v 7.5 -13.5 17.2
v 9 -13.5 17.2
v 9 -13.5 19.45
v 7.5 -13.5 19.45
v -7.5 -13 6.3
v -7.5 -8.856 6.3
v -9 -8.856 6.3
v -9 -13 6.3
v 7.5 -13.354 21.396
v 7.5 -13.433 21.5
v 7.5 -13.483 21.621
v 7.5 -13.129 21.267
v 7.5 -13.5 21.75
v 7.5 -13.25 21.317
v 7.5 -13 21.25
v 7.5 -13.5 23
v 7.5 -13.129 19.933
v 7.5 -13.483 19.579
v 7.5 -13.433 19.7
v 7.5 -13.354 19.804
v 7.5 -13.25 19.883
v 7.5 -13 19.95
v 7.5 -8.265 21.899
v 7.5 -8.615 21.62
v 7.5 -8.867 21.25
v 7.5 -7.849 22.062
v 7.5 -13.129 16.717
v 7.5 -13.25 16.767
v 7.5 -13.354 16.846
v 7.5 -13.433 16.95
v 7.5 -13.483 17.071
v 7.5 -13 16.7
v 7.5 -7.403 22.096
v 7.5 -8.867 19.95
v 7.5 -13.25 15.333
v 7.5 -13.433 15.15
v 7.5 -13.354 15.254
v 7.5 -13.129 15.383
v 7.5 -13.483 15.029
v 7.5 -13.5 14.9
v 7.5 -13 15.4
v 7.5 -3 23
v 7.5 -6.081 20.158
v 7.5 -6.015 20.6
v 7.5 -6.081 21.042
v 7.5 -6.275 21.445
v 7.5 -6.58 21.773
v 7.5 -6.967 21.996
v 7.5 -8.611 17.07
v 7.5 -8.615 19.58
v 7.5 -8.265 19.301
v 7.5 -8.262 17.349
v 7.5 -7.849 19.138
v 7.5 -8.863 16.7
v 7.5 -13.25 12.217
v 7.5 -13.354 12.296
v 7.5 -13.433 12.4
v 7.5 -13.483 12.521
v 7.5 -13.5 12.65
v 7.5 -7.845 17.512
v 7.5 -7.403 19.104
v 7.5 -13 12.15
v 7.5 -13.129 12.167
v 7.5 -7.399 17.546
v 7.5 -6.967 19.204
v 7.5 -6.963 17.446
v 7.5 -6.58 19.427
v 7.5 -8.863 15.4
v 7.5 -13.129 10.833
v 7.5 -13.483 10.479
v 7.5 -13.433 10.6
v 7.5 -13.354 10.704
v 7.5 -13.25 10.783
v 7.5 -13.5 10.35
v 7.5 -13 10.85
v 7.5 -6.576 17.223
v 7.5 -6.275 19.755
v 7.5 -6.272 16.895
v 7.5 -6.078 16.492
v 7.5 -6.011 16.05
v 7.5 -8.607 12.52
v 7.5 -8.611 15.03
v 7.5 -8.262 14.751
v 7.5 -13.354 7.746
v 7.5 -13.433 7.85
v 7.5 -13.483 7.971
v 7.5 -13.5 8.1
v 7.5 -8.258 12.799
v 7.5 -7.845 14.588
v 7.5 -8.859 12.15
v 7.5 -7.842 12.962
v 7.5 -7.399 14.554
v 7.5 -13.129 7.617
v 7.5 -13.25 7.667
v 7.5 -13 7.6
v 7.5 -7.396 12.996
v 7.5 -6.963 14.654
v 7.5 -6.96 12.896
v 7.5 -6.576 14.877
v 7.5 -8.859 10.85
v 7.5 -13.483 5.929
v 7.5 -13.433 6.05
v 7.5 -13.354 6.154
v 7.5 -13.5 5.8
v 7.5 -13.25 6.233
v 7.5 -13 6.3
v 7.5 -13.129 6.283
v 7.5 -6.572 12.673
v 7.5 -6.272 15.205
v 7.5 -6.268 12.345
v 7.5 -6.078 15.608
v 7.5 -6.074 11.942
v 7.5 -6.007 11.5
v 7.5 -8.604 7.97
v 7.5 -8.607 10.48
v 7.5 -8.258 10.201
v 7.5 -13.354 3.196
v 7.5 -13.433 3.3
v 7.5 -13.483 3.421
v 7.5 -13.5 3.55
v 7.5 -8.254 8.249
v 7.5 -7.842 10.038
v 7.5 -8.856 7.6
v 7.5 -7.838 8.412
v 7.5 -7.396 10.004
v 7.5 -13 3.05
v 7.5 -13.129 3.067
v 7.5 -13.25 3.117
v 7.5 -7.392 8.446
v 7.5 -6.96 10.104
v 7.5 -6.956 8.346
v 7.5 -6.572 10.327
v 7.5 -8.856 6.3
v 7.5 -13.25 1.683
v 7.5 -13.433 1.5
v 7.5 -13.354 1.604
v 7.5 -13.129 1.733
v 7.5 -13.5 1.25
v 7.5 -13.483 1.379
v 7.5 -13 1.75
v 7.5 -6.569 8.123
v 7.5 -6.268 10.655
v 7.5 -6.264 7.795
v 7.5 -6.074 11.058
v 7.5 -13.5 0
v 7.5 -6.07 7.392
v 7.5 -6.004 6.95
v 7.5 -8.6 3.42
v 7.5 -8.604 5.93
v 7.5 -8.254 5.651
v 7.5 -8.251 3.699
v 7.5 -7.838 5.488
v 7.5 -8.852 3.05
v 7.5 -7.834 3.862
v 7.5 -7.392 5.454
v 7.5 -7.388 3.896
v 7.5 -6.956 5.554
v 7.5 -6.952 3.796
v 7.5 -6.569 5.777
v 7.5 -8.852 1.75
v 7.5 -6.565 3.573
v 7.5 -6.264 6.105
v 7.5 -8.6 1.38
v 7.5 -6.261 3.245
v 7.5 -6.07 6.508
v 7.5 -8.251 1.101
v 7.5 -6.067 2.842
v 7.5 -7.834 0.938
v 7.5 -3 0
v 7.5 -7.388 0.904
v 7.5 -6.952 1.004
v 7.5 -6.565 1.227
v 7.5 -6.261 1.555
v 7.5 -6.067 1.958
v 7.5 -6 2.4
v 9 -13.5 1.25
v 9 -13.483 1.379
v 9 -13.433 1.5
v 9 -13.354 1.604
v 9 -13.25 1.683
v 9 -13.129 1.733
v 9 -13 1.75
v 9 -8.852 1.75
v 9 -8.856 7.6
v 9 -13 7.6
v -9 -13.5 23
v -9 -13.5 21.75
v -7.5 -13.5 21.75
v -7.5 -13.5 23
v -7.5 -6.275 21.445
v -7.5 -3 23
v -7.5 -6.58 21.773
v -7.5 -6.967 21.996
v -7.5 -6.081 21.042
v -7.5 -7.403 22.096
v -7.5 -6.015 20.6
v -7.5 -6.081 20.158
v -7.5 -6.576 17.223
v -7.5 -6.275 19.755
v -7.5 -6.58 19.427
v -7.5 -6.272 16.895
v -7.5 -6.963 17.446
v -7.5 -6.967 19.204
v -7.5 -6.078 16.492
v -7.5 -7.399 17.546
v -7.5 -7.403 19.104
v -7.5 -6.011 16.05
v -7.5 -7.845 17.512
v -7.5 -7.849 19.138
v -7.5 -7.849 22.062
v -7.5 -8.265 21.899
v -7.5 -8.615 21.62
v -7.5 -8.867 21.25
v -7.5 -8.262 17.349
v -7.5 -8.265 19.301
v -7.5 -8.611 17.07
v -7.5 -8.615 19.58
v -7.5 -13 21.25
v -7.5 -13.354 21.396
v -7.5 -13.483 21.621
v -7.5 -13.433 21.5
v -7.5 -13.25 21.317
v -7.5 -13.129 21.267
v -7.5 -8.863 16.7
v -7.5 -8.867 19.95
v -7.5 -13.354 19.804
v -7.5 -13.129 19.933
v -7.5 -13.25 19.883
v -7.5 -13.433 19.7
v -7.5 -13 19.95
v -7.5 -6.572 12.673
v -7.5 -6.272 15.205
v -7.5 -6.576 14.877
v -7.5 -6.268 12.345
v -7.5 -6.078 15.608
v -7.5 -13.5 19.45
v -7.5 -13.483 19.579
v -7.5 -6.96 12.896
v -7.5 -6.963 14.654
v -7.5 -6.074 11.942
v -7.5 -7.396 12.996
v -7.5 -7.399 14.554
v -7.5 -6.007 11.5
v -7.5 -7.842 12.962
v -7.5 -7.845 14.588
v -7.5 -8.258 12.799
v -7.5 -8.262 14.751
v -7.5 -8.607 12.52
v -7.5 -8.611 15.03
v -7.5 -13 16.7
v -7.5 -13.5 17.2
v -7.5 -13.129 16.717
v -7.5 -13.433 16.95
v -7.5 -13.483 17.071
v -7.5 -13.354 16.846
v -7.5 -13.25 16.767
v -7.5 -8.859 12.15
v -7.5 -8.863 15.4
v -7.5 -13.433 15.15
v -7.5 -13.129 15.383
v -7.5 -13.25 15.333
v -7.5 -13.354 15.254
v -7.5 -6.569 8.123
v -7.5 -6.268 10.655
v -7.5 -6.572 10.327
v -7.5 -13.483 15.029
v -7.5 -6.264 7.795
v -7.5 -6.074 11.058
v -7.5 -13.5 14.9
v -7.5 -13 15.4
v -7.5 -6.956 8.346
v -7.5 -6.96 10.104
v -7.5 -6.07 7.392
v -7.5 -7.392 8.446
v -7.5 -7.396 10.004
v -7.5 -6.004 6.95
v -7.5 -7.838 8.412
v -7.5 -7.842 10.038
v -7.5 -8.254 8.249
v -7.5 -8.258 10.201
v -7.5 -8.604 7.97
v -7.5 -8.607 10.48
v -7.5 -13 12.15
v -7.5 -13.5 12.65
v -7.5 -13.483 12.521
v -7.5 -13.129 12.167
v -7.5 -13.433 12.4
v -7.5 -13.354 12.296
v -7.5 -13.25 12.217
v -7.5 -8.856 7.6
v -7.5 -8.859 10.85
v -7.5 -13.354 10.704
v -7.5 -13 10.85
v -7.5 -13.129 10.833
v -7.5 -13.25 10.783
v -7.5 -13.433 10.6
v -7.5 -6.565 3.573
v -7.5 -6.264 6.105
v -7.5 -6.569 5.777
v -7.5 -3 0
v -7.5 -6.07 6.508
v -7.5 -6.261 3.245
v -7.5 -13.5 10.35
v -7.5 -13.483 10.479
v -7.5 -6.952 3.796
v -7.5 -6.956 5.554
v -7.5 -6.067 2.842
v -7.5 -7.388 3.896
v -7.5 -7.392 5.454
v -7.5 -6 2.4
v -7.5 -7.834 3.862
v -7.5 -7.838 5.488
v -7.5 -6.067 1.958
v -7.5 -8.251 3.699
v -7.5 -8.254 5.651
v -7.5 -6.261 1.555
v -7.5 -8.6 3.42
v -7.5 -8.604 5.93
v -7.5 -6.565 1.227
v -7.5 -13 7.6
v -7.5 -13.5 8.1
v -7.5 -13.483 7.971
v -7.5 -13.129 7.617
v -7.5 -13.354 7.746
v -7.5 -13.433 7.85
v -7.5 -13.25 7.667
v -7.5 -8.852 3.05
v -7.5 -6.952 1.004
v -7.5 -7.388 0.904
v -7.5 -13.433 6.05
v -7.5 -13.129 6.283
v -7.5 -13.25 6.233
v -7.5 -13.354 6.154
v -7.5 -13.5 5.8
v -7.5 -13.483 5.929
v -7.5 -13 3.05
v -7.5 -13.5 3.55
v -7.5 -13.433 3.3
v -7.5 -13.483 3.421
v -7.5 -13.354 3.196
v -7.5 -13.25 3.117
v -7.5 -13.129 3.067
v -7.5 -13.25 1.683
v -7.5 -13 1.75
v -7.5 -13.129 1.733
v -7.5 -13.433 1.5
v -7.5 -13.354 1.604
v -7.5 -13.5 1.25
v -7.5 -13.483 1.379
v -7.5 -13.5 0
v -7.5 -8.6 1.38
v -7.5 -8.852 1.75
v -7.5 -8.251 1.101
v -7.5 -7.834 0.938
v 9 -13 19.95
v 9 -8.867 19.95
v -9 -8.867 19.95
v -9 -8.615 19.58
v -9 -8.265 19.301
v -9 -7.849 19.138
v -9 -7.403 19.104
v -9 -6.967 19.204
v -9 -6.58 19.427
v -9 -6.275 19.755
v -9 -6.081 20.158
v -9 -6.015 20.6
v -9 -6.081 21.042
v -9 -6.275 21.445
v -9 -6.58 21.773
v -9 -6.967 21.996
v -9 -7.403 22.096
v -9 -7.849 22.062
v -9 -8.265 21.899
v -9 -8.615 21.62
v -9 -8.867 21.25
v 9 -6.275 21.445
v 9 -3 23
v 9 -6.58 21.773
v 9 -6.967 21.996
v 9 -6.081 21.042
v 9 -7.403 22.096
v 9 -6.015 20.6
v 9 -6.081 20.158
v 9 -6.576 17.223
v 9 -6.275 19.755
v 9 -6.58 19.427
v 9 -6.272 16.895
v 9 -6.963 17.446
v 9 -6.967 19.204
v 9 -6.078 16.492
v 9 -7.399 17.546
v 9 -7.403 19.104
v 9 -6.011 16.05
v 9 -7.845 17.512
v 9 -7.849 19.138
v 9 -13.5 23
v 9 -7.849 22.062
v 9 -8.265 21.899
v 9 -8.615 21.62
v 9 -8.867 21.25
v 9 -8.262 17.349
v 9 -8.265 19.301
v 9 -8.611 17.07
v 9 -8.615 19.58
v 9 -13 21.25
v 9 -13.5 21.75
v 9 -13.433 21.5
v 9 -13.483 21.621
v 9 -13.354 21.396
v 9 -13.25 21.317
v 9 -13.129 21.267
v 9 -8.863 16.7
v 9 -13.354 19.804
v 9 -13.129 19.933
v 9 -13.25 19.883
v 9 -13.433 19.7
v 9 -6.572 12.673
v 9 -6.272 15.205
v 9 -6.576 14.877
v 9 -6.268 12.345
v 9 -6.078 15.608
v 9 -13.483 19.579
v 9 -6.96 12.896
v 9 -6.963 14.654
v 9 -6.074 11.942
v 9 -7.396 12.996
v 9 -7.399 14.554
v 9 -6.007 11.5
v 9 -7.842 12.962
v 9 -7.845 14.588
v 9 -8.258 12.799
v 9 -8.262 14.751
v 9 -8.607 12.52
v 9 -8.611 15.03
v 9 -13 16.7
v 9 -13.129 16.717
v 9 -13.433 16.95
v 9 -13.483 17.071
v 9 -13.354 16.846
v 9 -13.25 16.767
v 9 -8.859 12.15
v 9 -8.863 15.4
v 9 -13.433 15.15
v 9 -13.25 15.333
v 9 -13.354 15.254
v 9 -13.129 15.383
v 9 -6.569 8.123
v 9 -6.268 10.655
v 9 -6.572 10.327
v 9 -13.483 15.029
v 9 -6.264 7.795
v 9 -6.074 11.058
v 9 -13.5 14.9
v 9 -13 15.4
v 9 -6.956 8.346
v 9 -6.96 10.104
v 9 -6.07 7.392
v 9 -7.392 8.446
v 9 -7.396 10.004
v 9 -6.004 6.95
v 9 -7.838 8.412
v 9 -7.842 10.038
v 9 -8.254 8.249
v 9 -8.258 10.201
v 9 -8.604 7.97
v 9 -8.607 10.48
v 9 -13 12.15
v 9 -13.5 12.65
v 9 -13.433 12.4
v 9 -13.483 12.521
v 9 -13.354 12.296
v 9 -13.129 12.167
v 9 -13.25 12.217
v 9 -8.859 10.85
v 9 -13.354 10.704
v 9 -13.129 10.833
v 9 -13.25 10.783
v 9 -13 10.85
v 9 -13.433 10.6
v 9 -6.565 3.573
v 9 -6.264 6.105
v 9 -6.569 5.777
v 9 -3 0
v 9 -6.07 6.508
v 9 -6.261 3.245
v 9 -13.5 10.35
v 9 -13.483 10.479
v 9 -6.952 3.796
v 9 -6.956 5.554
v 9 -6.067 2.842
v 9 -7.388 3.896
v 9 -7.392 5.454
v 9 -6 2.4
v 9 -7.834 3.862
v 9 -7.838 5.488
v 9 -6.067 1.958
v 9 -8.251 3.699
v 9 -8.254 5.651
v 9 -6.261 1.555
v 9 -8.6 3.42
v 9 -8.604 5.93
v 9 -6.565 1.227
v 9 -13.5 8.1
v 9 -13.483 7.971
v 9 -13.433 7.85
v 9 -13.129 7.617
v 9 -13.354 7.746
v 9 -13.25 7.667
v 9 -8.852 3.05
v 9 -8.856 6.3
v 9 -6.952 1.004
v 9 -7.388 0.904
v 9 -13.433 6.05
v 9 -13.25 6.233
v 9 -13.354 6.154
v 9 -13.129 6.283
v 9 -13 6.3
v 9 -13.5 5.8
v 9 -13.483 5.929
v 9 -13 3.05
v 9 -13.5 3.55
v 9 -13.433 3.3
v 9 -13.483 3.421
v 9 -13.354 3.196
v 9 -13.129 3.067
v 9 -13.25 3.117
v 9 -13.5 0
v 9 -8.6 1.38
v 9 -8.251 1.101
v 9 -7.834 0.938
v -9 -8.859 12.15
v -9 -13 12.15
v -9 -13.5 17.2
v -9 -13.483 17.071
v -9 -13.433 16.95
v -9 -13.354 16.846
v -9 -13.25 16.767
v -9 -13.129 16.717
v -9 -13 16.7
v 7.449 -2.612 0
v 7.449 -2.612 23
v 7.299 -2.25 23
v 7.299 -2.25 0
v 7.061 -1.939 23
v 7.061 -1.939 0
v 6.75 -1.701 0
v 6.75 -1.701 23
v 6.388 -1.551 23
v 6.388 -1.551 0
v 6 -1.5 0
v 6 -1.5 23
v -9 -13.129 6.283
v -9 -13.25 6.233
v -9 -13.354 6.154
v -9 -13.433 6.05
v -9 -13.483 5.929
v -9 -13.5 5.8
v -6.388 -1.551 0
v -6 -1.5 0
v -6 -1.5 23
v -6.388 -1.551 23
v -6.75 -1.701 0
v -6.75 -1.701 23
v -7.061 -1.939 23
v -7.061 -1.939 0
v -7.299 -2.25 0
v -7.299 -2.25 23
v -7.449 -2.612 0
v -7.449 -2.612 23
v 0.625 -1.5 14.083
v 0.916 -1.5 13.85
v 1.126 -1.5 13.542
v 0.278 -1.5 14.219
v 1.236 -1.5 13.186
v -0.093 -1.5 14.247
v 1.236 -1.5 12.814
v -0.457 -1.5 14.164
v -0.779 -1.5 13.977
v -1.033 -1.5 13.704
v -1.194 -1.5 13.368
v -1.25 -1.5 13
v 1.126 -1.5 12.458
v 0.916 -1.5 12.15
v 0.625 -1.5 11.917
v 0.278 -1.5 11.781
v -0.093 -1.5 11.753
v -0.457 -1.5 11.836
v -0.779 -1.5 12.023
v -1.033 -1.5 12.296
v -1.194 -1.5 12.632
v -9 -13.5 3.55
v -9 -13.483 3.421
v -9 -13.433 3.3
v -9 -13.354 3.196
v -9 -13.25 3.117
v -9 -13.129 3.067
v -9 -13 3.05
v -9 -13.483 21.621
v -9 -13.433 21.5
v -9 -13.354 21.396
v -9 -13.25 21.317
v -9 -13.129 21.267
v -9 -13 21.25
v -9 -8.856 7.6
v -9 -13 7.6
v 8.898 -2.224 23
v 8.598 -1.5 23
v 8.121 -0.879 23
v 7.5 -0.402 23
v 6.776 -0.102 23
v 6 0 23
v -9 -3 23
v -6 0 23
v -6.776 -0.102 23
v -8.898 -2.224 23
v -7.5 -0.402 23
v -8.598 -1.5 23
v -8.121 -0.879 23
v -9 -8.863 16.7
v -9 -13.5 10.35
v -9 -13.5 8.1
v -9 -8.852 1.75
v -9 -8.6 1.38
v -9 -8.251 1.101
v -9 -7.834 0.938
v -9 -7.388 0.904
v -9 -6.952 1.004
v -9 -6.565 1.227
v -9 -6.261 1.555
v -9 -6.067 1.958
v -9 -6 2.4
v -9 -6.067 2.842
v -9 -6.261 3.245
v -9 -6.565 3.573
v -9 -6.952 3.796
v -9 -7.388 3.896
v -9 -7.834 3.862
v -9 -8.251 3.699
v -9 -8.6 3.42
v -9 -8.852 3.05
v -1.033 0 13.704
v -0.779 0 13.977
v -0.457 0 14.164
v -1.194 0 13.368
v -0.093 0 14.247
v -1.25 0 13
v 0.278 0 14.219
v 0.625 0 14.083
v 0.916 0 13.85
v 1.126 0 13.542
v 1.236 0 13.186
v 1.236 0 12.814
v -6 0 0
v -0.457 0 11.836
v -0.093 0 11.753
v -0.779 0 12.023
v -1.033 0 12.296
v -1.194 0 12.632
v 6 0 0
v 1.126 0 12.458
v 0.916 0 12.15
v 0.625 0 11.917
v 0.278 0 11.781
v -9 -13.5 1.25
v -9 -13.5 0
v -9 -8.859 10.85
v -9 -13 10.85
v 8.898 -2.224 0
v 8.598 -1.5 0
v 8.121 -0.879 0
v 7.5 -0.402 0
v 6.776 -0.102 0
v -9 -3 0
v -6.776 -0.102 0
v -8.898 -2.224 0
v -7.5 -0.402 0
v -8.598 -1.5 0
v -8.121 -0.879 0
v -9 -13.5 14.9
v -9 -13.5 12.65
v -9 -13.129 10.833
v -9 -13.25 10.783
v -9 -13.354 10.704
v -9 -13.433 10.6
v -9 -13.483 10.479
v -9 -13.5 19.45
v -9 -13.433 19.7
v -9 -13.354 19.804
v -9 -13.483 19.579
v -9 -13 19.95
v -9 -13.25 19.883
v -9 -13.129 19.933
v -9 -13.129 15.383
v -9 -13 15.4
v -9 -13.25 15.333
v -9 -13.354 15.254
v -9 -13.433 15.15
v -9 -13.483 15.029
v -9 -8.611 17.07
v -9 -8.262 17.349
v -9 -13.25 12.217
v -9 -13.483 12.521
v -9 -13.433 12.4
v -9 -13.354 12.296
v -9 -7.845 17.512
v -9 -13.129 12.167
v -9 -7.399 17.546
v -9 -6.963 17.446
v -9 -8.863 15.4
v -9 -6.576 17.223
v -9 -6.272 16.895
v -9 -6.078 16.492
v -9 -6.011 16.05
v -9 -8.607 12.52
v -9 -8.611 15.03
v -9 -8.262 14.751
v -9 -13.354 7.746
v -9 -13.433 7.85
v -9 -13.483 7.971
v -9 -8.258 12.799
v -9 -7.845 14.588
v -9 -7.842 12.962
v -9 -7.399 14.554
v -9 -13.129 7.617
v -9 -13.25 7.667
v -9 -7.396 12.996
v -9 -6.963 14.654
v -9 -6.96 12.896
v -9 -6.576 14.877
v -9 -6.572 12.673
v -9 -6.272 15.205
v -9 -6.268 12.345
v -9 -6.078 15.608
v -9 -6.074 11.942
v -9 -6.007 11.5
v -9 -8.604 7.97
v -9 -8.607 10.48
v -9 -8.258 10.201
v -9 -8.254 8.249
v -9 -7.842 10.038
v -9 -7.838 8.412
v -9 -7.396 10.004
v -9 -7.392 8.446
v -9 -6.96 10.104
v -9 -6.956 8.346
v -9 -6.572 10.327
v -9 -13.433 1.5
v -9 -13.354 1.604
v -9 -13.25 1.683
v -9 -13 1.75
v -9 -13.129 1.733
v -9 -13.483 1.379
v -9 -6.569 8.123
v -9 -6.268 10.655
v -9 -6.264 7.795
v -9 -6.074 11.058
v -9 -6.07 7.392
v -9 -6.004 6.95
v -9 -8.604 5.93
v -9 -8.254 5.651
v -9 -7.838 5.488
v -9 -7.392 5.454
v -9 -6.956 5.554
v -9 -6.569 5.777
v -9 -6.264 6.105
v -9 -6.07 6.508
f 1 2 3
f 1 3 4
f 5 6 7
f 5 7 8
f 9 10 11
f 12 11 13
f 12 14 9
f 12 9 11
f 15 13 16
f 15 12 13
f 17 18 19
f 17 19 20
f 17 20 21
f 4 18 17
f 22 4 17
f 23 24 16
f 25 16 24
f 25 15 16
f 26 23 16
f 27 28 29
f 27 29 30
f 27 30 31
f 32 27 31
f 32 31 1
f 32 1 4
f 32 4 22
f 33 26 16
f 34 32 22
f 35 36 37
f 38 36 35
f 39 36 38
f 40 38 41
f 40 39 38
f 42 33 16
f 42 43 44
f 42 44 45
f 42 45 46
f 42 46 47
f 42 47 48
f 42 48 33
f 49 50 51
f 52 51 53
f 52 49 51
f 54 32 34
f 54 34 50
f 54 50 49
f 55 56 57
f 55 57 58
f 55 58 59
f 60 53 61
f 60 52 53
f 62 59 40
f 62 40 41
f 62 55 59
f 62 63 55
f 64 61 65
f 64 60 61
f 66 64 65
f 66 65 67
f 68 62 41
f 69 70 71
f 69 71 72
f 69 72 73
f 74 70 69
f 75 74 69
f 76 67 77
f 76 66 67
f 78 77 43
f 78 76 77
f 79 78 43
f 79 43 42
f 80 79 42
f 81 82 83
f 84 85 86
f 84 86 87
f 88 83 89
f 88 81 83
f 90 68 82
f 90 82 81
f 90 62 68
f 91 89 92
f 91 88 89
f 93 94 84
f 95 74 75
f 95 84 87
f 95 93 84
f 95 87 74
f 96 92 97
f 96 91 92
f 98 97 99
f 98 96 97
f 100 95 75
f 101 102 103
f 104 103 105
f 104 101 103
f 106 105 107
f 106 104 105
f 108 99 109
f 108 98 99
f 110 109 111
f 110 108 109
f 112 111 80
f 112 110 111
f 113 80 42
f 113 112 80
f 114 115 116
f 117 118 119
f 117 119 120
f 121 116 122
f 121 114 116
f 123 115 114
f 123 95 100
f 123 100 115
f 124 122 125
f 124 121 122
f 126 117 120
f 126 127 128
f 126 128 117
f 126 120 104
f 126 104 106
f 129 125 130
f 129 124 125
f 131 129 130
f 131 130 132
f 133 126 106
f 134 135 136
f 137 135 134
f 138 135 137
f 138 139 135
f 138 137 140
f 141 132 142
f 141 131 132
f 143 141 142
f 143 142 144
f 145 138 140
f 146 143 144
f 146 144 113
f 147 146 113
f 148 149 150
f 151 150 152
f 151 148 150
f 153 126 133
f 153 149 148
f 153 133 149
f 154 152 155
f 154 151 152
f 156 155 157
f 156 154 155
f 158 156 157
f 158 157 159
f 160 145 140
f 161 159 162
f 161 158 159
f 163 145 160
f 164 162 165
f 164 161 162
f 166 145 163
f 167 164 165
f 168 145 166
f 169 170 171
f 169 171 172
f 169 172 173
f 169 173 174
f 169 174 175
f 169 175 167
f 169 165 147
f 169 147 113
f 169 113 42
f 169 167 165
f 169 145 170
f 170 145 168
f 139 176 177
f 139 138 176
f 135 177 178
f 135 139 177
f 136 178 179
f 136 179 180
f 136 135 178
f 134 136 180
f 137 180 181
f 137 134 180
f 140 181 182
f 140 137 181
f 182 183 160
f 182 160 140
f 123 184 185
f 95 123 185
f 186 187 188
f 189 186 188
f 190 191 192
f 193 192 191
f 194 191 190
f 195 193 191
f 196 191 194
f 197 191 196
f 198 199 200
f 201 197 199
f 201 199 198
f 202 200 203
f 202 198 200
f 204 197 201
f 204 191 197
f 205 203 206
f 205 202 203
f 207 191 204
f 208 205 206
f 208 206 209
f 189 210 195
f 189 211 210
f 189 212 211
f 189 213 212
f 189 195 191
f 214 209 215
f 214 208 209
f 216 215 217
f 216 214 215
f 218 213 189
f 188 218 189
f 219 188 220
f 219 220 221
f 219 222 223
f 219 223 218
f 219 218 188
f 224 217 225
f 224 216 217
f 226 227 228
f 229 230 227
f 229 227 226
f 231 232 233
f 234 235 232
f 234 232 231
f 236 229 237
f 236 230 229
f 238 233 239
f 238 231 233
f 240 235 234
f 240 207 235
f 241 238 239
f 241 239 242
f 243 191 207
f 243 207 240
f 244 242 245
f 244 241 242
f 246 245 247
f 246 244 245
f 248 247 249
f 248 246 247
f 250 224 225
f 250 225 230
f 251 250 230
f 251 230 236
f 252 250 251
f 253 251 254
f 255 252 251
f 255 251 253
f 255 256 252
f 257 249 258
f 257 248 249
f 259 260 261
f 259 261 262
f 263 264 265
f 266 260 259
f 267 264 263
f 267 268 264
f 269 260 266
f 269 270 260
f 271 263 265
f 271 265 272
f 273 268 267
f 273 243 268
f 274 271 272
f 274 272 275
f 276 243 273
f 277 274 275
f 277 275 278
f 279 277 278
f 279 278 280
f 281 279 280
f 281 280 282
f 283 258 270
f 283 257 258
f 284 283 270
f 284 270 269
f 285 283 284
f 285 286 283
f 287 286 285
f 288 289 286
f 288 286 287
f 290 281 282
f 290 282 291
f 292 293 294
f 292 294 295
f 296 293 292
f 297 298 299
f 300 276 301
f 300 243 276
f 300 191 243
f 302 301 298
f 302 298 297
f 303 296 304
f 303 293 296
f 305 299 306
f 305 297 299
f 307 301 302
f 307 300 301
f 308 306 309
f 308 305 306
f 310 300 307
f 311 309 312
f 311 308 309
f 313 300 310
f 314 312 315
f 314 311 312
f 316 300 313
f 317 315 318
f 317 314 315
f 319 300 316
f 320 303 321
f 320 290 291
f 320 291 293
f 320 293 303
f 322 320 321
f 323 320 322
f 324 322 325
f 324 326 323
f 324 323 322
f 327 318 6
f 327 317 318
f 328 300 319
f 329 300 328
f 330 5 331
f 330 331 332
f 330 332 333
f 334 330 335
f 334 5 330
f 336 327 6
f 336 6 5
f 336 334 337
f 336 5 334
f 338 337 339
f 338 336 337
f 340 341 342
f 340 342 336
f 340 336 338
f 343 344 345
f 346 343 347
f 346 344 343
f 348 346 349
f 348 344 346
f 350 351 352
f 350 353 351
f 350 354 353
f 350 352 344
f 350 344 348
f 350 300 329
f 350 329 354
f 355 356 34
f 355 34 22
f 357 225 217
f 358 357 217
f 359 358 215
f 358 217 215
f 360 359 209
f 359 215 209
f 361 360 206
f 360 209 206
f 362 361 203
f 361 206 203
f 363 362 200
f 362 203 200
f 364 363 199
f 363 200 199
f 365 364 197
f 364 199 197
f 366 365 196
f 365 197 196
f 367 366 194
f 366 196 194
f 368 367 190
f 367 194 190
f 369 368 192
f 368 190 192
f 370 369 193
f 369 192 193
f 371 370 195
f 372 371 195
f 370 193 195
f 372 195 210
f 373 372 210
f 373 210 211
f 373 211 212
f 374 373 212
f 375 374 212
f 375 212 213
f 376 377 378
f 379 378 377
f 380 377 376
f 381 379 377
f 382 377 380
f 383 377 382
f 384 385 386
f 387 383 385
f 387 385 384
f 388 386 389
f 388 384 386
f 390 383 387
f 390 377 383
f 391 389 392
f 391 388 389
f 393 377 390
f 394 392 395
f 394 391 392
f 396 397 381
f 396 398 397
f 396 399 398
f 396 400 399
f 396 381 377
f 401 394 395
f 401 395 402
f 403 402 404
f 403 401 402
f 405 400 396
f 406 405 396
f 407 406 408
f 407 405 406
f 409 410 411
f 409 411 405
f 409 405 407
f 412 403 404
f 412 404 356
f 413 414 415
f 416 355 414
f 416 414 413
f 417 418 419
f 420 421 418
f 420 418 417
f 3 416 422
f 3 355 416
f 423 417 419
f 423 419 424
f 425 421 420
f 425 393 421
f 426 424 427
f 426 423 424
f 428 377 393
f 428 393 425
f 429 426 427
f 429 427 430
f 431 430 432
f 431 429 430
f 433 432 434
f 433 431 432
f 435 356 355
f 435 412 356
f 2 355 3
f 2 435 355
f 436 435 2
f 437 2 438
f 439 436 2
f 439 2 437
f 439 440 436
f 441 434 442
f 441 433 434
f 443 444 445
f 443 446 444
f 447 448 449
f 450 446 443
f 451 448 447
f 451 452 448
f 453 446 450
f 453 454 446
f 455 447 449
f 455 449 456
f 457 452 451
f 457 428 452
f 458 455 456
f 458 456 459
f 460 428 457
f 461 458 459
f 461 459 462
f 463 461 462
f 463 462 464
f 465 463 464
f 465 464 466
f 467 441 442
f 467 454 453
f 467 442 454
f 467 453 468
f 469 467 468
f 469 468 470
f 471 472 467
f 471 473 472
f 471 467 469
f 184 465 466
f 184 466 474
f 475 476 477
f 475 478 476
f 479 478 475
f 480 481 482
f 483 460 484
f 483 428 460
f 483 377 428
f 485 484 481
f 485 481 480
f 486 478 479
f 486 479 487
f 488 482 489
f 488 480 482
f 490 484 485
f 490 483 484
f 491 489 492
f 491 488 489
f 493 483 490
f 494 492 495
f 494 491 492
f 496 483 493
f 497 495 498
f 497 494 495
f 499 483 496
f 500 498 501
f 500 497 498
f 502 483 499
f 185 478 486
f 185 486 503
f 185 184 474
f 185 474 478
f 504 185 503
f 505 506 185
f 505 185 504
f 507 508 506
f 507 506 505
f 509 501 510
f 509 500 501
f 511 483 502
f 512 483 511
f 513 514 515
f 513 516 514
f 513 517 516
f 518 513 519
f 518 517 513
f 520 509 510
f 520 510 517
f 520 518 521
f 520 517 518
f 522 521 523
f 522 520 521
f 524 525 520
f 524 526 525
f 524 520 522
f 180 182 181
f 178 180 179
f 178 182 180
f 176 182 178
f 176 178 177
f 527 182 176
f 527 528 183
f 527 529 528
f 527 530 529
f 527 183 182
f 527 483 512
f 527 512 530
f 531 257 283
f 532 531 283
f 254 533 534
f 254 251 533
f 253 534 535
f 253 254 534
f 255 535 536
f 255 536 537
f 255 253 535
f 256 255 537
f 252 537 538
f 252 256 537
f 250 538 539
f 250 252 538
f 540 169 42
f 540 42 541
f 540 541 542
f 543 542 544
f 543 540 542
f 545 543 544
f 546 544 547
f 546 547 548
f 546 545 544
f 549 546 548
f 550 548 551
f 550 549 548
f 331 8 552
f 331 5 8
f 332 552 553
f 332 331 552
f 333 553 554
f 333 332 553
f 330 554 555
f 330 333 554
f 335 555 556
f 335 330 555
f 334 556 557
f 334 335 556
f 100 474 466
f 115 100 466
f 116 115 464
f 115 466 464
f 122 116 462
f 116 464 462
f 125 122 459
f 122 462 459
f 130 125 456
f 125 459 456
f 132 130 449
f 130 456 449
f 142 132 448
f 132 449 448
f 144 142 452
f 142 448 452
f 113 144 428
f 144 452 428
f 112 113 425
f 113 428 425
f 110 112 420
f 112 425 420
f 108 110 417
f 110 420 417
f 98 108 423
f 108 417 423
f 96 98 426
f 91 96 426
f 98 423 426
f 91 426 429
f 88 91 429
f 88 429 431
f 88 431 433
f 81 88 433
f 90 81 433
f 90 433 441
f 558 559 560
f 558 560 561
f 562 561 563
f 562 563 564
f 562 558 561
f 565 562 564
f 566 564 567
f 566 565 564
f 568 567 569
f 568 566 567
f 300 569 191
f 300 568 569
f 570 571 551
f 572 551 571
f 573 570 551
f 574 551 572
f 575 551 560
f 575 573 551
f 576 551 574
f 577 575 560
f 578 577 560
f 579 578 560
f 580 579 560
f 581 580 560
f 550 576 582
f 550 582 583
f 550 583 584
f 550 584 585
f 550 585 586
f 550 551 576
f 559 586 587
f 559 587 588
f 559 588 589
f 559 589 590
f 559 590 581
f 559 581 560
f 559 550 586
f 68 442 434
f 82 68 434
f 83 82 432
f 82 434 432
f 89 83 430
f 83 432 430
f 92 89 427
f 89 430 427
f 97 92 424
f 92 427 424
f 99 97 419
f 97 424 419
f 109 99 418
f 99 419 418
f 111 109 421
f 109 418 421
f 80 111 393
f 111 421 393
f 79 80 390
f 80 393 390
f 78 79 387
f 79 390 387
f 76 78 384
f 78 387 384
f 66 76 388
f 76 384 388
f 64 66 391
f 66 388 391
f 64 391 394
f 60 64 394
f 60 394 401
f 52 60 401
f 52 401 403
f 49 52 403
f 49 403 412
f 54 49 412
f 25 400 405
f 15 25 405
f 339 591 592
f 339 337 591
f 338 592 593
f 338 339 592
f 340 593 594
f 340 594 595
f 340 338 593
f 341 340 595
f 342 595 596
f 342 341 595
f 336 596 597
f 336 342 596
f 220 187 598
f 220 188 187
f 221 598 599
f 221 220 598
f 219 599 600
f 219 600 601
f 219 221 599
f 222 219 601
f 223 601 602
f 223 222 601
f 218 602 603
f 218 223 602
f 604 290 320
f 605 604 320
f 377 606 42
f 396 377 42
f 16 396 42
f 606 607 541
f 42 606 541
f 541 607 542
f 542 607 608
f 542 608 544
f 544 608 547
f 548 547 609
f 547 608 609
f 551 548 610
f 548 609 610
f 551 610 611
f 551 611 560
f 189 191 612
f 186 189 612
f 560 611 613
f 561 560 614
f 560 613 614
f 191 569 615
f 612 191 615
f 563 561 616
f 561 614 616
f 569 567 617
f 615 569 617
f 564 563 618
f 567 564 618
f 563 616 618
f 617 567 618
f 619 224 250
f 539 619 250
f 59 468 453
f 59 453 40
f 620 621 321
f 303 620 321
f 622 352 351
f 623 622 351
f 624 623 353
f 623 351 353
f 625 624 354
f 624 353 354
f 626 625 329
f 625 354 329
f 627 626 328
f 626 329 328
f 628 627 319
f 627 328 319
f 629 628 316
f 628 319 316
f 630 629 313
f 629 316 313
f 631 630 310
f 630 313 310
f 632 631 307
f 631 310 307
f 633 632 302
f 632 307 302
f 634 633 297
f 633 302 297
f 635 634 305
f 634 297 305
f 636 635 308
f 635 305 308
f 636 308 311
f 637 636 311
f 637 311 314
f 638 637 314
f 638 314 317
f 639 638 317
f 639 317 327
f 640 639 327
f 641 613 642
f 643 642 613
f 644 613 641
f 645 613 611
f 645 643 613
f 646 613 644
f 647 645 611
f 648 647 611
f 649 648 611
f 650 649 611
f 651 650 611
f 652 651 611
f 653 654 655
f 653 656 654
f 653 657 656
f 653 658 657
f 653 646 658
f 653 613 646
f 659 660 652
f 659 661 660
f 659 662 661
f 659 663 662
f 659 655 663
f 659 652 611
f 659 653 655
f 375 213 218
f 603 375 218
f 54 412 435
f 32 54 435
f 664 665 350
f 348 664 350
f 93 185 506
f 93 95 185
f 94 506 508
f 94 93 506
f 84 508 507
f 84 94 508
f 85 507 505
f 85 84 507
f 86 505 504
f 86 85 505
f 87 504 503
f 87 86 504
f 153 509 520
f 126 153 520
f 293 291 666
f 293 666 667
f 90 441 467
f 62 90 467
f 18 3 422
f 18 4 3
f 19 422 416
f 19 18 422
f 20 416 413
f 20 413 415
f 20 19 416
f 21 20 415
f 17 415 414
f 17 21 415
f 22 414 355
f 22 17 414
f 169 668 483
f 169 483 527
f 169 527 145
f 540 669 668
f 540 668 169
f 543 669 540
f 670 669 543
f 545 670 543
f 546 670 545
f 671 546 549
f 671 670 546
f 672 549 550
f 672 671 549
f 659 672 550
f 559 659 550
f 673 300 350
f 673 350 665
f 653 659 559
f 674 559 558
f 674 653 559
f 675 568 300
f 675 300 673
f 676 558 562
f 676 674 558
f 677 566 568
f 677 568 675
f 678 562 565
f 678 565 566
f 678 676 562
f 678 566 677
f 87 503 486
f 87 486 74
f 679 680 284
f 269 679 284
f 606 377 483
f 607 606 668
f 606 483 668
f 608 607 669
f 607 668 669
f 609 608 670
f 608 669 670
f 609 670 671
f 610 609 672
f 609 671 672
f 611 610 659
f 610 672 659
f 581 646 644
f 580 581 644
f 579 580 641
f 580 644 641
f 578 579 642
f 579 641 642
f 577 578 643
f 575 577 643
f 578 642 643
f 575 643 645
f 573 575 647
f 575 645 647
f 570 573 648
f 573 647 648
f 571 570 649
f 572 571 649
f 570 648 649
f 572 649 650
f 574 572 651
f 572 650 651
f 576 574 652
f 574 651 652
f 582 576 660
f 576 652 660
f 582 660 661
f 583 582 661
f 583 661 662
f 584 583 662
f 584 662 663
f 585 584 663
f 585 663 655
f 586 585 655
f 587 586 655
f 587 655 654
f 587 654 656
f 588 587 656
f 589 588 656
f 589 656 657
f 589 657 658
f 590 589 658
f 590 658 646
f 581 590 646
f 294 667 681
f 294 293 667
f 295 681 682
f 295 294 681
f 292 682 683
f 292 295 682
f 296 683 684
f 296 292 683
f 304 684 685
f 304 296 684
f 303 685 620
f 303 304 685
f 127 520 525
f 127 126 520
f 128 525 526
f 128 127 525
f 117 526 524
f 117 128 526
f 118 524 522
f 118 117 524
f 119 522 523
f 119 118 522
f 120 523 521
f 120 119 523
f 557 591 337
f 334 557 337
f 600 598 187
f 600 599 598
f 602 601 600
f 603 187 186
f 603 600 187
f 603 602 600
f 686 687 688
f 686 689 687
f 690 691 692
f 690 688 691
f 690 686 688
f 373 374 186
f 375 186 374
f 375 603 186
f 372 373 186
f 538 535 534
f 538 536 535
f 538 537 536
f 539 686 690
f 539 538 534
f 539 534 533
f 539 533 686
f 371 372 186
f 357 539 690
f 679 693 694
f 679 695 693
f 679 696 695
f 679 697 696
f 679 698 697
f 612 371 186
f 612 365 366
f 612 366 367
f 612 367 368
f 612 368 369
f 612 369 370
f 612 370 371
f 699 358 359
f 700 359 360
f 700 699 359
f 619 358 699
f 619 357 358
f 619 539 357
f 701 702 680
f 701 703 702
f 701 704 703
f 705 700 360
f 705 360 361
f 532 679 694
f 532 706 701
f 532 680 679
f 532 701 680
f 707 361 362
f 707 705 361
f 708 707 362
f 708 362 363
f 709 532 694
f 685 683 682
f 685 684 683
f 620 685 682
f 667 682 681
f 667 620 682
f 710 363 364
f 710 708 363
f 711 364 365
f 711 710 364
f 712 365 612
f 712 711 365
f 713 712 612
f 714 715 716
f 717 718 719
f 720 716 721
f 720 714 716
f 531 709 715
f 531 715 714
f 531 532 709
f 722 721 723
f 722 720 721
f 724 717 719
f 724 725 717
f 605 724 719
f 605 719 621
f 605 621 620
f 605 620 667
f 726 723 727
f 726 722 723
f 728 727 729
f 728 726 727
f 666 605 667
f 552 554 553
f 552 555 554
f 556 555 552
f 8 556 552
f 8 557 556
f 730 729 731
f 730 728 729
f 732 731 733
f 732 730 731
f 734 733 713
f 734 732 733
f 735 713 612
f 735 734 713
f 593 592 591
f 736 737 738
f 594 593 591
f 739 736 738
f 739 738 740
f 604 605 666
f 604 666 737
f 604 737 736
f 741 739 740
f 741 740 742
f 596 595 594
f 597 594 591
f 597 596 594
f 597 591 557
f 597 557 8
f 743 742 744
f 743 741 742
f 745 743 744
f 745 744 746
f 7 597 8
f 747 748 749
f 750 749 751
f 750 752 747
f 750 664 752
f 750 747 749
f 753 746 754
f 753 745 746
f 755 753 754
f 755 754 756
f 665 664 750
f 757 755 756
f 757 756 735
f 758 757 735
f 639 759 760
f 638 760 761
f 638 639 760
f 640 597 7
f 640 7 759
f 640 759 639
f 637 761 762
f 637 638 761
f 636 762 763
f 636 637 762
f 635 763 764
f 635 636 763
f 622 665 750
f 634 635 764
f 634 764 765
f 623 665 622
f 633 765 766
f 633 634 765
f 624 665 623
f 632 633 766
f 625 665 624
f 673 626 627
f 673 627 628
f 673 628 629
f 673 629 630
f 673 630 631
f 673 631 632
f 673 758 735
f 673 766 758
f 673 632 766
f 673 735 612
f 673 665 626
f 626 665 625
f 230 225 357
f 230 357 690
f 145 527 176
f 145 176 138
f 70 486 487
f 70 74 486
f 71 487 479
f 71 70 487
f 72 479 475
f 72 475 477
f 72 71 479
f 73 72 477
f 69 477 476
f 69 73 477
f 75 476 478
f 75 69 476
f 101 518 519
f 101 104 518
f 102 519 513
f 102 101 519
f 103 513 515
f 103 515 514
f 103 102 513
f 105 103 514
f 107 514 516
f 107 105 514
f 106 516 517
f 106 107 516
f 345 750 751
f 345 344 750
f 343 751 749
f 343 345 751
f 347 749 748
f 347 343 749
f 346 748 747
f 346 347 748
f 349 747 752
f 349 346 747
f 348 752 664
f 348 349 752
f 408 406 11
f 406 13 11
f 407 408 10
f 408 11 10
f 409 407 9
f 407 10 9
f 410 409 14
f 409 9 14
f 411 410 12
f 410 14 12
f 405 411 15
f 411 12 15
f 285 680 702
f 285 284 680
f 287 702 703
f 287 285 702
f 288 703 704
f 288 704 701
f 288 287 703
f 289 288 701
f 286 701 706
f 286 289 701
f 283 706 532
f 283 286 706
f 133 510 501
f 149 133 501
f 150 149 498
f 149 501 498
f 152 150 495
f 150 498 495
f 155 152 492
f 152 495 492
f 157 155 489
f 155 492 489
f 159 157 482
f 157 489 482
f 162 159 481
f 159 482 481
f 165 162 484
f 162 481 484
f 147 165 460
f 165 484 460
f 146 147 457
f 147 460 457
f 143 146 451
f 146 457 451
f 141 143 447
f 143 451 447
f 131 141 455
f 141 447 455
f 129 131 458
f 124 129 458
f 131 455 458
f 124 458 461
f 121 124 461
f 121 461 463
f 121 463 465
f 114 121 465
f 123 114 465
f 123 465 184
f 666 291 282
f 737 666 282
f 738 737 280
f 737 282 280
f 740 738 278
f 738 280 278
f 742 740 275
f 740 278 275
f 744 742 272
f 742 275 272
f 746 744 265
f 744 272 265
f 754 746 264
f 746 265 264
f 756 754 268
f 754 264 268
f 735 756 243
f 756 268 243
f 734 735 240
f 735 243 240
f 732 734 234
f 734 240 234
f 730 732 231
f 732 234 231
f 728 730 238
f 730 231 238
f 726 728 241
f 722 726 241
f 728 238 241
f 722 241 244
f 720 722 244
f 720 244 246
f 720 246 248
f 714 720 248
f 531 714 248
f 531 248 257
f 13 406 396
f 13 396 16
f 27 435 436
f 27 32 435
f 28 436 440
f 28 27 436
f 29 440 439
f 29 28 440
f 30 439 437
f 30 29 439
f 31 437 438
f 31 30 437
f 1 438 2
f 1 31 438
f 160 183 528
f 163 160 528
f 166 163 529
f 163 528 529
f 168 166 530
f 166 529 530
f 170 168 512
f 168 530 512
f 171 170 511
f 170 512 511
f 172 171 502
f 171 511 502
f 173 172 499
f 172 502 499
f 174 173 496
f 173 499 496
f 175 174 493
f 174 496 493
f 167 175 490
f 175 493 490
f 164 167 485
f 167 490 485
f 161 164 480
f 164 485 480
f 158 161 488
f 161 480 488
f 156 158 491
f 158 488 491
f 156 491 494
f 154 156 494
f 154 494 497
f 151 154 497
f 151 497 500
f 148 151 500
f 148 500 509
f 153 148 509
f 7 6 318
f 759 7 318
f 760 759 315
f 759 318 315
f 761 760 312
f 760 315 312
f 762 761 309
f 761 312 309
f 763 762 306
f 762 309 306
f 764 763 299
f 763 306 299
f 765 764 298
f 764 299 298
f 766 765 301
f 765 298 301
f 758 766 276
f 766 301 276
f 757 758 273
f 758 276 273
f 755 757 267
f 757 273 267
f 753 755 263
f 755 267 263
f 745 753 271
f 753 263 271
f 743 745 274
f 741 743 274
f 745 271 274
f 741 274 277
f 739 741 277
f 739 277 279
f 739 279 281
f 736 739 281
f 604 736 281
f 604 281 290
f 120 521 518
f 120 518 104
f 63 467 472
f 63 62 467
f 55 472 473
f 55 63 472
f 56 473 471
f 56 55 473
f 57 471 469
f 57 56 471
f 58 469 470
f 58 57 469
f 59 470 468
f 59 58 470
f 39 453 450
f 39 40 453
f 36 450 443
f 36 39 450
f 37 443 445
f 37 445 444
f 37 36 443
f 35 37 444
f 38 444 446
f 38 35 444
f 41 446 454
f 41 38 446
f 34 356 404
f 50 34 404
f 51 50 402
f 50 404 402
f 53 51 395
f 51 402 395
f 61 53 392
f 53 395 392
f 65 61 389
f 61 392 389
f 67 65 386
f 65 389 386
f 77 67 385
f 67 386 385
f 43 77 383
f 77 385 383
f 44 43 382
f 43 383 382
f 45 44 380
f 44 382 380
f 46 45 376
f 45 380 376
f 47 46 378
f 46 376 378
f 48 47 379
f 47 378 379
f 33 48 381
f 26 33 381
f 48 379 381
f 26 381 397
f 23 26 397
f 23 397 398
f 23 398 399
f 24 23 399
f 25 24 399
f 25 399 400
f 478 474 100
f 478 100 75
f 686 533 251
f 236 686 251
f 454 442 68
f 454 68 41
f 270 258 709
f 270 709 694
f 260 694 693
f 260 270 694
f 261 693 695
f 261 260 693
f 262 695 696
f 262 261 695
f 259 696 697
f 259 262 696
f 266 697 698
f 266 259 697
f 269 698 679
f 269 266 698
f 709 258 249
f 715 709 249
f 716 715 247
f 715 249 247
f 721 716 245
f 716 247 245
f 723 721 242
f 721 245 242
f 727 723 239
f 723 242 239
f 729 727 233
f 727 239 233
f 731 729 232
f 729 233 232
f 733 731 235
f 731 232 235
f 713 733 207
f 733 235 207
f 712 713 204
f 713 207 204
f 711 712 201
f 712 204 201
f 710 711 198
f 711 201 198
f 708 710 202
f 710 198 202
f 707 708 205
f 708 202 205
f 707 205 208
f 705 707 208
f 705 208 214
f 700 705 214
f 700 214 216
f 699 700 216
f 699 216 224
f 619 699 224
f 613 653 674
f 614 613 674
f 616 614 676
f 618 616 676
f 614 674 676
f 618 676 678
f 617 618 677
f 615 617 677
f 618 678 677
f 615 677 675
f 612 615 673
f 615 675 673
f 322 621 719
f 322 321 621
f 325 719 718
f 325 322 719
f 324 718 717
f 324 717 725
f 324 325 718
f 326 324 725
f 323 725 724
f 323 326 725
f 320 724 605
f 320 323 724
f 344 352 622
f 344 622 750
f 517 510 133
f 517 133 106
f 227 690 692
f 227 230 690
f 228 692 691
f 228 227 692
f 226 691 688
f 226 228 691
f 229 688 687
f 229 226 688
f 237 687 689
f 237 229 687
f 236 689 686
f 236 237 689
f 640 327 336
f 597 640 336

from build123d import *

# Parameters (mm, degrees)
PAD_DEPTH       = 23
POCKET_DEPTH    = 18.001
FILLET_R        = 0.5
SKETCH002_R     = 1.25
POCKET001_DEPTH = 5


with BuildPart() as part:
    # Sketch → Pad (new body)
    with BuildSketch(Plane.XY):
        with BuildLine():
            Line((-9, -13.5), (-9, -3))
            ThreePointArc((-6, 0), (-8.12132, -0.87868), (-9, -3))
            Line((-6, 0), (6, 0))
            ThreePointArc((9, -3), (8.12132, -0.87868), (6, 0))
            Line((9, -3), (9, -13.5))
            Line((9, -13.5), (7.5, -13.5))
            Line((7.5, -13.5), (7.5, -3))
            ThreePointArc((7.5, -3), (7.06066, -1.93934), (6, -1.5))
            Line((6, -1.5), (-6, -1.5))
            ThreePointArc((-6, -1.5), (-7.06066, -1.93934), (-7.5, -3))
            Line((-7.5, -3), (-7.5, -13.5))
            Line((-9, -13.5), (-7.5, -13.5))
        make_face()
    extrude(amount=PAD_DEPTH)

    # Sketch001 (on DatumPlane) → Pocket (cut, through all)
    with BuildSketch(Plane.YZ.offset(9)):
        with BuildLine():
            ThreePointArc((-8.851851, 1.75), (-6, 2.4), (-8.851851, 3.05))
            Line((-8.851851, 3.05), (-14, 3.05))
            Line((-14, 3.05), (-14, 1.75))
            Line((-8.851851, 1.75), (-14, 1.75))
        make_face()
        with BuildLine():
            ThreePointArc((-8.855532, 6.3), (-6.003681, 6.95), (-8.855532, 7.6))
            Line((-8.855532, 7.6), (-14.003681, 7.6))
            Line((-14.003681, 7.6), (-14.003681, 6.3))
            Line((-8.855532, 6.3), (-14.003681, 6.3))
        make_face()
        with BuildLine():
            ThreePointArc((-8.859213, 10.85), (-6.007362, 11.5), (-8.859213, 12.15))
            Line((-8.859213, 12.15), (-14.007362, 12.15))
            Line((-14.007362, 12.15), (-14.007362, 10.85))
            Line((-8.859213, 10.85), (-14.007362, 10.85))
        make_face()
        with BuildLine():
            ThreePointArc((-8.862893, 15.4), (-6.011042, 16.05), (-8.862893, 16.7))
            Line((-8.862893, 16.7), (-14.011042, 16.7))
            Line((-14.011042, 16.7), (-14.011042, 15.4))
            Line((-8.862893, 15.4), (-14.011042, 15.4))
        make_face()
        with BuildLine():
            ThreePointArc((-8.866575, 19.95), (-6.014724, 20.6), (-8.866575, 21.25))
            Line((-8.866575, 21.25), (-14.014724, 21.25))
            Line((-14.014724, 21.25), (-14.014724, 19.95))
            Line((-8.866575, 19.95), (-14.014724, 19.95))
        make_face()
    extrude(amount=-POCKET_DEPTH, mode=Mode.SUBTRACT)

    # Fillet
    fillet_edges = [part.edges().sort_by_distance(p)[0] for p in [
        (-8.25, -13.5, 19.95),
        (-8.25, -13.5, 21.25),
        (-8.25, -13.5, 16.7),
        (-8.25, -13.5, 15.4),
        (-8.25, -13.5, 12.15),
        (-8.25, -13.5, 10.85),
        (-8.25, -13.5, 7.6),
        (-8.25, -13.5, 6.3),
        (-8.25, -13.5, 3.05),
        (-8.25, -13.5, 1.75),
        (8.25, -13.5, 21.25),
        (8.25, -13.5, 19.95),
        (8.25, -13.5, 16.7),
        (8.25, -13.5, 15.4),
        (8.25, -13.5, 12.15),
        (8.25, -13.5, 10.85),
        (8.25, -13.5, 7.6),
        (8.25, -13.5, 6.3),
        (8.25, -13.5, 3.05),
        (8.25, -13.5, 1.75),
    ]]
    fillet(fillet_edges, radius=FILLET_R)

    # Sketch002 (on DatumPlane) → Pocket001 (cut)
    with BuildSketch(Plane(origin=(0, 0, 0), x_dir=(-1, 0, 0), z_dir=(0, 1, 0))):
        with Locations((0, 13)):
            Circle(SKETCH002_R)
    extrude(amount=-POCKET001_DEPTH, mode=Mode.SUBTRACT)


solid = part.part
